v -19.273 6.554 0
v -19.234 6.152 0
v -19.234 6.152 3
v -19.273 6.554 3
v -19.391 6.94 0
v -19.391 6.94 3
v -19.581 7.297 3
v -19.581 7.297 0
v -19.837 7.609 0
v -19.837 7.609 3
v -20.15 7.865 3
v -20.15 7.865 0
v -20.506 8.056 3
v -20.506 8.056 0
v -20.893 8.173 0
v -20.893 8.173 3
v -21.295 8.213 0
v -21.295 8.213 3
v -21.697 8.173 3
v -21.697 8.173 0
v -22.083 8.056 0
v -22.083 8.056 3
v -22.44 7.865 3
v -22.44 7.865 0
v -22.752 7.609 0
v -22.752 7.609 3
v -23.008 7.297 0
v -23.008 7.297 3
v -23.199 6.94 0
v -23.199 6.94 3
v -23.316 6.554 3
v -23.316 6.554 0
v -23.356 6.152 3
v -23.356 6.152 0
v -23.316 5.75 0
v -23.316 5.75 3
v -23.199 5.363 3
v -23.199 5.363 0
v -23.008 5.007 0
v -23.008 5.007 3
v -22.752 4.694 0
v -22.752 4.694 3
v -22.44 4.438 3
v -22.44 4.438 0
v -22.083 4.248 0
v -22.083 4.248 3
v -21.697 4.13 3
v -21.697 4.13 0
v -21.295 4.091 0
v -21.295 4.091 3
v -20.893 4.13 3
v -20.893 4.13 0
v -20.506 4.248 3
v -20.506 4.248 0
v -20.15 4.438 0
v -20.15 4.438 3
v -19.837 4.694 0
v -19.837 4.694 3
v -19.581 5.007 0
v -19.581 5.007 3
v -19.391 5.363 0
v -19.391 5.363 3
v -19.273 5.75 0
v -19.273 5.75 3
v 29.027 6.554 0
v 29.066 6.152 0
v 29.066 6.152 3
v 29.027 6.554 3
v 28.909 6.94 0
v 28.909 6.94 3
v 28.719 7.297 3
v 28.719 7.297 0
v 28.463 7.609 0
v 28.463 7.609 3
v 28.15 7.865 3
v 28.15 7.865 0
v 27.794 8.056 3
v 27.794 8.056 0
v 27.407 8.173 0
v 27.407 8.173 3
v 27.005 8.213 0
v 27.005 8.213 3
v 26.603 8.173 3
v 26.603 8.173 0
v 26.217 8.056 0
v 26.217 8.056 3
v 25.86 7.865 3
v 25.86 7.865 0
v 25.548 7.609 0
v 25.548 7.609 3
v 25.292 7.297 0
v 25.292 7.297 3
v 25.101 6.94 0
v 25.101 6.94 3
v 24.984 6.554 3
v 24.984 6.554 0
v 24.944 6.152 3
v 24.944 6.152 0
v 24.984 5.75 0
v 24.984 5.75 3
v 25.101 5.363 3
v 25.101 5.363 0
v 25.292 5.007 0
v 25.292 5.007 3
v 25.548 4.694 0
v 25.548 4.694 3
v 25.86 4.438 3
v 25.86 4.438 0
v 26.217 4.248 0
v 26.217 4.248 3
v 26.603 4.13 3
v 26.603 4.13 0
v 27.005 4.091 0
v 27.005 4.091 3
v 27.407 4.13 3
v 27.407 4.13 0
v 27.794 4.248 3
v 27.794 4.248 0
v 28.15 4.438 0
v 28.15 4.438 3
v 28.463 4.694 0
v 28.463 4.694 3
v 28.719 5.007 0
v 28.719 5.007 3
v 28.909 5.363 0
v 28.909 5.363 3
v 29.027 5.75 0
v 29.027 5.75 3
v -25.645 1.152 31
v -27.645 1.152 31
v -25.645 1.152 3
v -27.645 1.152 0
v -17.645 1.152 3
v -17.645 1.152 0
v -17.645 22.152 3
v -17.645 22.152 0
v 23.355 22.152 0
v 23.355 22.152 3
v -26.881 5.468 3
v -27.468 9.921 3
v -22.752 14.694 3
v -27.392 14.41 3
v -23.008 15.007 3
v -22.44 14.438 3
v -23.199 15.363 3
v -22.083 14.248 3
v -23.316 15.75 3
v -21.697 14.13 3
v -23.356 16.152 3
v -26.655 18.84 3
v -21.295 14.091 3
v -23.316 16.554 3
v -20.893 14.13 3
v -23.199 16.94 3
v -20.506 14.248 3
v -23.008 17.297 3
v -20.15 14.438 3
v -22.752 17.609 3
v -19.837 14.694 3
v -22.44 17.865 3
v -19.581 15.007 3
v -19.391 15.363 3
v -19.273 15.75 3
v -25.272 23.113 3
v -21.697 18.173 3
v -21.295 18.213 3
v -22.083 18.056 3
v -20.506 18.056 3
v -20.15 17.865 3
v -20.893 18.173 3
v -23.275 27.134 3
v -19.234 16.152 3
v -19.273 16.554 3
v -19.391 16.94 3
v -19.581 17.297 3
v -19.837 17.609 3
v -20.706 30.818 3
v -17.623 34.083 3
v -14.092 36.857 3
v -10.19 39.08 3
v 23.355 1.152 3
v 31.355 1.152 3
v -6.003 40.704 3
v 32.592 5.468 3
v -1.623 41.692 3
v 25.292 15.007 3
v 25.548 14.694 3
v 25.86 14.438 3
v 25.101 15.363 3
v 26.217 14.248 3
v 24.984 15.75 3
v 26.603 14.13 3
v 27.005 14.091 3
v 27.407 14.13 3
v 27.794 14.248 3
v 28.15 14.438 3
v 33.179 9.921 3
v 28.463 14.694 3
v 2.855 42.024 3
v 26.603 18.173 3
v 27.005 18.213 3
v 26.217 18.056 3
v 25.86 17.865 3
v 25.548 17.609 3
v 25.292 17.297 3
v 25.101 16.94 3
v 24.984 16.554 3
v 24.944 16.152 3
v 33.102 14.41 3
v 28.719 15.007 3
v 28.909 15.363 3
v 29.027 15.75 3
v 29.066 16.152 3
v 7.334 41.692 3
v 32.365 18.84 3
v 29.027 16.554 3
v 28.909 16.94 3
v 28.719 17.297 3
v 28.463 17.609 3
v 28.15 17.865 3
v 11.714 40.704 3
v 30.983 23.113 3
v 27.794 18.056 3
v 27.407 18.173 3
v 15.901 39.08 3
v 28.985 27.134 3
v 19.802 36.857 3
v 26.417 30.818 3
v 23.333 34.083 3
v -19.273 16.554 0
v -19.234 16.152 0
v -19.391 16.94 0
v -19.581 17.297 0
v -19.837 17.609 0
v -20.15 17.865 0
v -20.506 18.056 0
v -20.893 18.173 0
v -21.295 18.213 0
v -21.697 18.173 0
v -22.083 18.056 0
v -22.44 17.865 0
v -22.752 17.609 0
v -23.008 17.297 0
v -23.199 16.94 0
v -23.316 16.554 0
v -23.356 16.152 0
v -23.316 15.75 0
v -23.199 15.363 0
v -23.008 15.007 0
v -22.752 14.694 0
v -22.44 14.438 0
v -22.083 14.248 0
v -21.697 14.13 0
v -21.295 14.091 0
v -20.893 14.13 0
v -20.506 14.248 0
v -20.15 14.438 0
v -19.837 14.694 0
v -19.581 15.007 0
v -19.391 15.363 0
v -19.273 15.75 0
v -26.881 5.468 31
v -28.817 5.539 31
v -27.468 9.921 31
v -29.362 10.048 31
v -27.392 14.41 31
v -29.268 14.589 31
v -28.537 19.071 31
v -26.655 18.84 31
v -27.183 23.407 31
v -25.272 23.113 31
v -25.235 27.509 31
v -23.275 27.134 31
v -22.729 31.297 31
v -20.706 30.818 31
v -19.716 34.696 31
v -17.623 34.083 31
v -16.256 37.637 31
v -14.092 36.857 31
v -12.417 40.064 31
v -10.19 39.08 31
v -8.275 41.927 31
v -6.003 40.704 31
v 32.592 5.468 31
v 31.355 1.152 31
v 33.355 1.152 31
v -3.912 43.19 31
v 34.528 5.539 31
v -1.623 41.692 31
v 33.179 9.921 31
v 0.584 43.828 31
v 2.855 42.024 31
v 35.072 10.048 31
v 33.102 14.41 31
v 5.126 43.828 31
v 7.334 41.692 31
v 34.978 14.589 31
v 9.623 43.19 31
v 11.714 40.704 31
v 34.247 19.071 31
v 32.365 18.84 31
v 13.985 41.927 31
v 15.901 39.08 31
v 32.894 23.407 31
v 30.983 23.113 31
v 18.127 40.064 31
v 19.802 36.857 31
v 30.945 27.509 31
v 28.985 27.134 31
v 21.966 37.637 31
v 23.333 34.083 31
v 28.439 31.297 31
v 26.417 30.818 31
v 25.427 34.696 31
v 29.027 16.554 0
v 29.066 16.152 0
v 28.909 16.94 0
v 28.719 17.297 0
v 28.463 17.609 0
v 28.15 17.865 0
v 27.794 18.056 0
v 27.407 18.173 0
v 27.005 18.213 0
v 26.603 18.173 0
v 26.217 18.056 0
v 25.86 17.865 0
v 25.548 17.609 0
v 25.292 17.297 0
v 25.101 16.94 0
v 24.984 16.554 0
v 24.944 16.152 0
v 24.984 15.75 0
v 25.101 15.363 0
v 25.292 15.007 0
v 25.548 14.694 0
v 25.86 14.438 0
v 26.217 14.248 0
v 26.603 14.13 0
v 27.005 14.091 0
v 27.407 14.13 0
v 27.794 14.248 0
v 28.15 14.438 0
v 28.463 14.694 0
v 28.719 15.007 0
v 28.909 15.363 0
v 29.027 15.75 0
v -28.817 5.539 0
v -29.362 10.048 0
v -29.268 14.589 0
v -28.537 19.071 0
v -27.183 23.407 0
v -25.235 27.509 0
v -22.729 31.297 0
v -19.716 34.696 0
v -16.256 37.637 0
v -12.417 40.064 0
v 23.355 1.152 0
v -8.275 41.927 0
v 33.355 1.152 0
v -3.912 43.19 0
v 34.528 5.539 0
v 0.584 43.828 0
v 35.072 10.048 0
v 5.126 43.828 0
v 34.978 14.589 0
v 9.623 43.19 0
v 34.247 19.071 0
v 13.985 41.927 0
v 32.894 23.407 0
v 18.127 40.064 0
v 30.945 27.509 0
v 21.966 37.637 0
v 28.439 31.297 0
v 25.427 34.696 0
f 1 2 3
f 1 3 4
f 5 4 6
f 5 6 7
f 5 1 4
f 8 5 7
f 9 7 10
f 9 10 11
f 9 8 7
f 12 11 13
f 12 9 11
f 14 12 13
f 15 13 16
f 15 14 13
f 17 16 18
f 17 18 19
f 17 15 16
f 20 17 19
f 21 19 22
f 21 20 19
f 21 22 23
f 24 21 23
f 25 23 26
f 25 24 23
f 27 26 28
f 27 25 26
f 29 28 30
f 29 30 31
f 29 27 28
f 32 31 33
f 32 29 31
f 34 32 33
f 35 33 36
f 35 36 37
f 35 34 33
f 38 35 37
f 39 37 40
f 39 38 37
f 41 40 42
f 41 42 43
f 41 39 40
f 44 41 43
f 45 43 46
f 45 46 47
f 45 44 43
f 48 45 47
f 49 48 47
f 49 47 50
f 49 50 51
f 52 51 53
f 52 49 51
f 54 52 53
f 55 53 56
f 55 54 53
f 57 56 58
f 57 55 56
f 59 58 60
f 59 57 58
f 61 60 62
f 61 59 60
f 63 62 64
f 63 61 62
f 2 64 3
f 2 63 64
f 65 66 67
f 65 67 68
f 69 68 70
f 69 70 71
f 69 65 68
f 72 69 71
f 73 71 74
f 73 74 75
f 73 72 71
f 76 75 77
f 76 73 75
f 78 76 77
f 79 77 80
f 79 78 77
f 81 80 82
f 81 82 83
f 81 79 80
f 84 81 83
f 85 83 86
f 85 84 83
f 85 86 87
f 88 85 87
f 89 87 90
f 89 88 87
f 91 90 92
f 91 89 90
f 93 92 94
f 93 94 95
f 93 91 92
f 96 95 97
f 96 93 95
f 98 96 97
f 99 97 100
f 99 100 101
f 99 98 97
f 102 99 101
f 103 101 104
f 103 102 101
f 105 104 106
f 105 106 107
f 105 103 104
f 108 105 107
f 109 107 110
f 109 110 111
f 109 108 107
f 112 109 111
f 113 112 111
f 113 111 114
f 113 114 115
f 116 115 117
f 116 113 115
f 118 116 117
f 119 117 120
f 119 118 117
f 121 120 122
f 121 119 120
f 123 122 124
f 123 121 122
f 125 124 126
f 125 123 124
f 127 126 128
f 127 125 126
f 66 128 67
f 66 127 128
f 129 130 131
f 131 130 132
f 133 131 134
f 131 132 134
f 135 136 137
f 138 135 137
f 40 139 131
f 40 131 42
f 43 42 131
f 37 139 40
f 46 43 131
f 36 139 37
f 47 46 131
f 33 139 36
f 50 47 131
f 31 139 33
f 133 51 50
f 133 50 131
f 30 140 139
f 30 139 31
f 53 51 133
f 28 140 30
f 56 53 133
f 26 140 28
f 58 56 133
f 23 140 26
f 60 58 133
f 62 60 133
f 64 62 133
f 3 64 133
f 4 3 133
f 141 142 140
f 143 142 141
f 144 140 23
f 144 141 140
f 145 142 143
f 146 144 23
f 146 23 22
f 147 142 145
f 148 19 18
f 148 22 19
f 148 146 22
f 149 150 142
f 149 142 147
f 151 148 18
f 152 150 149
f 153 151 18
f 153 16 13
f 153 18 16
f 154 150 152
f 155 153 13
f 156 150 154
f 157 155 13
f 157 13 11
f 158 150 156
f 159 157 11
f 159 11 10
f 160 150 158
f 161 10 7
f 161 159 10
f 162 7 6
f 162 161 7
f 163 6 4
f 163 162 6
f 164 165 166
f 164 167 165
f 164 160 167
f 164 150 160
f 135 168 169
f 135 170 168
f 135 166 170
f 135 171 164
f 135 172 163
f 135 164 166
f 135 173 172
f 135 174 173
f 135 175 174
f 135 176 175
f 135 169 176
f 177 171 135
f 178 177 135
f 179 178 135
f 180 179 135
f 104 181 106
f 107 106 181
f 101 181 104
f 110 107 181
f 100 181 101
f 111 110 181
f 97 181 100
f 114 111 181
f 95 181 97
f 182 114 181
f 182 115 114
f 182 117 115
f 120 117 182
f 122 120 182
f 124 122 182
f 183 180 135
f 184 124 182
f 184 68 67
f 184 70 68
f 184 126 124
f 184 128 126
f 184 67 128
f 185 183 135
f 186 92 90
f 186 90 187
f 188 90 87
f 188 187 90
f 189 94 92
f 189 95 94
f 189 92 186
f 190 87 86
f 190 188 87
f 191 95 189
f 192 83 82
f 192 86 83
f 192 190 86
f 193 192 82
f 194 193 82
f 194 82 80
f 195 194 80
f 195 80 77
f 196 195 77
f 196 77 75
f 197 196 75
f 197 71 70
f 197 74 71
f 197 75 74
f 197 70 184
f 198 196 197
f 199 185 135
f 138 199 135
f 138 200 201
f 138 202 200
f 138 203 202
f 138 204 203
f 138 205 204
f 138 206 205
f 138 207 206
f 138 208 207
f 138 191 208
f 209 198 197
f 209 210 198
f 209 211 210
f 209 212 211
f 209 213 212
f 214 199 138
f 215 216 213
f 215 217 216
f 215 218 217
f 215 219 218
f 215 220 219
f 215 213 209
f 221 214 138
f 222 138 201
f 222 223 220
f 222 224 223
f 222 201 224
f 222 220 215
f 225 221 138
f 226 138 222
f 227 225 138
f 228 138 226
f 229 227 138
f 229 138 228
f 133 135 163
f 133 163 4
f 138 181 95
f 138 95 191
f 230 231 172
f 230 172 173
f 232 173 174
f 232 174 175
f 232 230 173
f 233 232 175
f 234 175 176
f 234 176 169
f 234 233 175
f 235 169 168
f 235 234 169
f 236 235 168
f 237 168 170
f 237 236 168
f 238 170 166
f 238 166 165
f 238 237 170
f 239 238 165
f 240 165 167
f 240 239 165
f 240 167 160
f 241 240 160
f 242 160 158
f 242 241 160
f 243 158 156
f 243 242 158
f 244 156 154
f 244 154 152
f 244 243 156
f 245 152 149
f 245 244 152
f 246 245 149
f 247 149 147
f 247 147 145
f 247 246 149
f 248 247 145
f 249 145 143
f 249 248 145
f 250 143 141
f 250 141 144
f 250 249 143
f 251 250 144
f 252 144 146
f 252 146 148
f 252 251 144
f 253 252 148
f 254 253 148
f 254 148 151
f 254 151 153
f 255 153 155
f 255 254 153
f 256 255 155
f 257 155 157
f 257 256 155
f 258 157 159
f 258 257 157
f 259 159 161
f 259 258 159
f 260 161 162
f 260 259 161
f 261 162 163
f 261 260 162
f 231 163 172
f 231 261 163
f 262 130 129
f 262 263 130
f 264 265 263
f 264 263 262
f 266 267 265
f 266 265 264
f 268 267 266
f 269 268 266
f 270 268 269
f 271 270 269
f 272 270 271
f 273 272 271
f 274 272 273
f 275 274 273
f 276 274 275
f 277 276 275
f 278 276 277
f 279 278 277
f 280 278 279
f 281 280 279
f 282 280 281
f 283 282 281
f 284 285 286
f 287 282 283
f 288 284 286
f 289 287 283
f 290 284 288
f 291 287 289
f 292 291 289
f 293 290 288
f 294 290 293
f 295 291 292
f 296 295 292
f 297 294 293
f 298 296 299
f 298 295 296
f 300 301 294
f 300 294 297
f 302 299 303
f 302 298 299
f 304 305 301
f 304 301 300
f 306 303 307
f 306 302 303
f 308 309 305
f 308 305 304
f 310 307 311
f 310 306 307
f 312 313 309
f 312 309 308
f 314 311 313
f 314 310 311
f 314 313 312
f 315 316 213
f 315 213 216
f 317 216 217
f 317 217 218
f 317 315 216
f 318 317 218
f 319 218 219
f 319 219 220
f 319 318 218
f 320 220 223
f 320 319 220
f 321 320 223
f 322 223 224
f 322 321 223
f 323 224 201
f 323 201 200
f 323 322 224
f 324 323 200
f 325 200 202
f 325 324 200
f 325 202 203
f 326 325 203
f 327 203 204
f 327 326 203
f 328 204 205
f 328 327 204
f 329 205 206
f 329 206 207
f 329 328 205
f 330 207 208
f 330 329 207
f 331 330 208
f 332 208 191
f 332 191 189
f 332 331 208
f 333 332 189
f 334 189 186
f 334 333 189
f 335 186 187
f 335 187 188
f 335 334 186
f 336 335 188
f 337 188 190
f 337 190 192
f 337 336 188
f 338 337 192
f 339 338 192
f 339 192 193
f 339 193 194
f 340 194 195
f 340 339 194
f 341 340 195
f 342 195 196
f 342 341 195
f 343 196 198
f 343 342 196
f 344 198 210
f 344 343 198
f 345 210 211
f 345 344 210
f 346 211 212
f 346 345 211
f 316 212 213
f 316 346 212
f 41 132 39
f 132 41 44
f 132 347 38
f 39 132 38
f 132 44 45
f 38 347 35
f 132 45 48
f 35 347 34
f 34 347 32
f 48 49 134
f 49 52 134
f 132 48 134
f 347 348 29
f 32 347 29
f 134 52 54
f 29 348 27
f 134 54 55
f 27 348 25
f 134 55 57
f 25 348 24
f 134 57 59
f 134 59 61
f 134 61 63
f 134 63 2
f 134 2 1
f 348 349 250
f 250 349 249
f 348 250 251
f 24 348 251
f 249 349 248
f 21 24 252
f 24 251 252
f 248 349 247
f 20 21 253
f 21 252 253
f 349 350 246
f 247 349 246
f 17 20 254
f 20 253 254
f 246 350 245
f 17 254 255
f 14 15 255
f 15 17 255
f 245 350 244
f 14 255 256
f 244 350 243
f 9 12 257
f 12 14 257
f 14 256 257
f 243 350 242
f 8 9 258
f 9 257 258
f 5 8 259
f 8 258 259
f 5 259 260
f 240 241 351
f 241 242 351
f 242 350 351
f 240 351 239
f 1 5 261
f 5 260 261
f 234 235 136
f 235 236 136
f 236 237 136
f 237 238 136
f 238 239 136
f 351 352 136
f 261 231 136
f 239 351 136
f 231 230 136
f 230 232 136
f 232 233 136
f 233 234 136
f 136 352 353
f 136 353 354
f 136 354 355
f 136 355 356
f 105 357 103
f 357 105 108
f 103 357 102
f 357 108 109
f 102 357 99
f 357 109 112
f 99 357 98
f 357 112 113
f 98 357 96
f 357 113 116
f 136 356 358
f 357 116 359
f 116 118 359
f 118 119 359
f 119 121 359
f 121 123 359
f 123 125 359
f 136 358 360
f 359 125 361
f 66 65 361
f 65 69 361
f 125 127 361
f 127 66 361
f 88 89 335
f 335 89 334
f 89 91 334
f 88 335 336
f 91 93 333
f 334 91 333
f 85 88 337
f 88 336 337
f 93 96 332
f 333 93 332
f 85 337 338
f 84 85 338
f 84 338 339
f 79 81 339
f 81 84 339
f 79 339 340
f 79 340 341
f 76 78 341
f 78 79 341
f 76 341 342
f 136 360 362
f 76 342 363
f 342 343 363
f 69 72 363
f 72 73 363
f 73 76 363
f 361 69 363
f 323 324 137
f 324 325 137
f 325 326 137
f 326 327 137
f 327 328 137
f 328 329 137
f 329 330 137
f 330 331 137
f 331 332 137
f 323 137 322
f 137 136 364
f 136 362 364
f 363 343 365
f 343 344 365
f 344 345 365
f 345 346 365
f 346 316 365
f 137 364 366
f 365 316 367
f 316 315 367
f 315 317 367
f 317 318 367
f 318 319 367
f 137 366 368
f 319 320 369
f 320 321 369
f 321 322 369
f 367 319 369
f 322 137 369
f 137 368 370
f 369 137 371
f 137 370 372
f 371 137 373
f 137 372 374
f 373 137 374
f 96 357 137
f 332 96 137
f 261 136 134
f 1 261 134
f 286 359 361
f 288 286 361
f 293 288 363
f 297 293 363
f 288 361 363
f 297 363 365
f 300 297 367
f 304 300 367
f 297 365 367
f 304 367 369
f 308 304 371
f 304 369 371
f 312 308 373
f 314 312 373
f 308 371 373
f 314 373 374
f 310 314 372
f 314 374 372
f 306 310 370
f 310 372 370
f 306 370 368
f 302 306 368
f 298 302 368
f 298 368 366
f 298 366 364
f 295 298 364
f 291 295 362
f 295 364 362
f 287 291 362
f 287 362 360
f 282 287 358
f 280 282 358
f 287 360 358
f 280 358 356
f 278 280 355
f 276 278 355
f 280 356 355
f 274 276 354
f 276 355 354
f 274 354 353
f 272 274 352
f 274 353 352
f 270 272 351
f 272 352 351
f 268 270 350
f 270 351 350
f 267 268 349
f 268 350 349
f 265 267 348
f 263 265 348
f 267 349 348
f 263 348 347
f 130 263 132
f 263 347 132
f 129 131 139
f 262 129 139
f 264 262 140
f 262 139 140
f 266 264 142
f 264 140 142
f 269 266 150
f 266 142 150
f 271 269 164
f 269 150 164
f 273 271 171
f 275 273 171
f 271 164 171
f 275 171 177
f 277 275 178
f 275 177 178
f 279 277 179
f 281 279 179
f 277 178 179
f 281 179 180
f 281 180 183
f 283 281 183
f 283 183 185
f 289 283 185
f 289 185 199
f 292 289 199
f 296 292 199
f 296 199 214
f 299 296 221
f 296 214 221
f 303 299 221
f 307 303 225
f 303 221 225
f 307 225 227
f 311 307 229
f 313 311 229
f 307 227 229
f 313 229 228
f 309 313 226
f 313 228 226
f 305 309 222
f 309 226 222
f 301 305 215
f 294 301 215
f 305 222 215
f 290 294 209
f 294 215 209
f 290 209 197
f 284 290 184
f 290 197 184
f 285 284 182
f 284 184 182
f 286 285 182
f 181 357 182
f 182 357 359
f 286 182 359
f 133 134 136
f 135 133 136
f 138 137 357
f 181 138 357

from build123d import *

# Parameters (mm, degrees)
CROQUIS1_R              = 2.060946668
SALIENTE_EXTRUIR1_DEPTH = 3
SALIENTE_EXTRUIR2_DEPTH = 28


with BuildPart() as part:
    # Croquis1 → Saliente-Extruir1 (new body)
    with BuildSketch(Plane.XY):
        with BuildLine():
            Line((-17.644764035, 22.151573595), (23.355235965, 22.151573595))
            Line((23.355235965, 22.151573595), (23.355235965, 1.151573595))
            Line((23.355235965, 1.151573595), (33.355235965, 1.151573595))
            ThreePointArc((33.355235965, 1.151573595), (2.855235965, 43.908355827), (-27.644764035, 1.151573595))
            Line((-27.644764035, 1.151573595), (-17.644764035, 1.151573595))
            Line((-17.644764035, 1.151573595), (-17.644764035, 22.151573595))
        make_face()
        with Locations((27.005235965, 6.151573595)):
            Circle(CROQUIS1_R, mode=Mode.SUBTRACT)
        with Locations((-21.294764035, 6.151573595)):
            Circle(CROQUIS1_R, mode=Mode.SUBTRACT)
        with Locations((-21.294764035, 16.151573595)):
            Circle(CROQUIS1_R, mode=Mode.SUBTRACT)
        with Locations((27.005235965, 16.151573595)):
            Circle(CROQUIS1_R, mode=Mode.SUBTRACT)
    extrude(amount=SALIENTE_EXTRUIR1_DEPTH)

    # Croquis2 → Saliente-Extruir2 (add)
    with BuildSketch(Plane.XY.offset(3)):
        with BuildLine():
            Line((-27.644764035, 1.151573595), (-25.644764035, 1.151573595))
            ThreePointArc((-25.644764035, 1.151573595), (2.855235965, 42.024258692), (31.355235965, 1.151573595))
            Line((31.355235965, 1.151573595), (33.355235965, 1.151573595))
            ThreePointArc((33.355235965, 1.151573595), (2.855235965, 43.908355827), (-27.644764035, 1.151573595))
        make_face()
    extrude(amount=SALIENTE_EXTRUIR2_DEPTH)


solid = part.part
